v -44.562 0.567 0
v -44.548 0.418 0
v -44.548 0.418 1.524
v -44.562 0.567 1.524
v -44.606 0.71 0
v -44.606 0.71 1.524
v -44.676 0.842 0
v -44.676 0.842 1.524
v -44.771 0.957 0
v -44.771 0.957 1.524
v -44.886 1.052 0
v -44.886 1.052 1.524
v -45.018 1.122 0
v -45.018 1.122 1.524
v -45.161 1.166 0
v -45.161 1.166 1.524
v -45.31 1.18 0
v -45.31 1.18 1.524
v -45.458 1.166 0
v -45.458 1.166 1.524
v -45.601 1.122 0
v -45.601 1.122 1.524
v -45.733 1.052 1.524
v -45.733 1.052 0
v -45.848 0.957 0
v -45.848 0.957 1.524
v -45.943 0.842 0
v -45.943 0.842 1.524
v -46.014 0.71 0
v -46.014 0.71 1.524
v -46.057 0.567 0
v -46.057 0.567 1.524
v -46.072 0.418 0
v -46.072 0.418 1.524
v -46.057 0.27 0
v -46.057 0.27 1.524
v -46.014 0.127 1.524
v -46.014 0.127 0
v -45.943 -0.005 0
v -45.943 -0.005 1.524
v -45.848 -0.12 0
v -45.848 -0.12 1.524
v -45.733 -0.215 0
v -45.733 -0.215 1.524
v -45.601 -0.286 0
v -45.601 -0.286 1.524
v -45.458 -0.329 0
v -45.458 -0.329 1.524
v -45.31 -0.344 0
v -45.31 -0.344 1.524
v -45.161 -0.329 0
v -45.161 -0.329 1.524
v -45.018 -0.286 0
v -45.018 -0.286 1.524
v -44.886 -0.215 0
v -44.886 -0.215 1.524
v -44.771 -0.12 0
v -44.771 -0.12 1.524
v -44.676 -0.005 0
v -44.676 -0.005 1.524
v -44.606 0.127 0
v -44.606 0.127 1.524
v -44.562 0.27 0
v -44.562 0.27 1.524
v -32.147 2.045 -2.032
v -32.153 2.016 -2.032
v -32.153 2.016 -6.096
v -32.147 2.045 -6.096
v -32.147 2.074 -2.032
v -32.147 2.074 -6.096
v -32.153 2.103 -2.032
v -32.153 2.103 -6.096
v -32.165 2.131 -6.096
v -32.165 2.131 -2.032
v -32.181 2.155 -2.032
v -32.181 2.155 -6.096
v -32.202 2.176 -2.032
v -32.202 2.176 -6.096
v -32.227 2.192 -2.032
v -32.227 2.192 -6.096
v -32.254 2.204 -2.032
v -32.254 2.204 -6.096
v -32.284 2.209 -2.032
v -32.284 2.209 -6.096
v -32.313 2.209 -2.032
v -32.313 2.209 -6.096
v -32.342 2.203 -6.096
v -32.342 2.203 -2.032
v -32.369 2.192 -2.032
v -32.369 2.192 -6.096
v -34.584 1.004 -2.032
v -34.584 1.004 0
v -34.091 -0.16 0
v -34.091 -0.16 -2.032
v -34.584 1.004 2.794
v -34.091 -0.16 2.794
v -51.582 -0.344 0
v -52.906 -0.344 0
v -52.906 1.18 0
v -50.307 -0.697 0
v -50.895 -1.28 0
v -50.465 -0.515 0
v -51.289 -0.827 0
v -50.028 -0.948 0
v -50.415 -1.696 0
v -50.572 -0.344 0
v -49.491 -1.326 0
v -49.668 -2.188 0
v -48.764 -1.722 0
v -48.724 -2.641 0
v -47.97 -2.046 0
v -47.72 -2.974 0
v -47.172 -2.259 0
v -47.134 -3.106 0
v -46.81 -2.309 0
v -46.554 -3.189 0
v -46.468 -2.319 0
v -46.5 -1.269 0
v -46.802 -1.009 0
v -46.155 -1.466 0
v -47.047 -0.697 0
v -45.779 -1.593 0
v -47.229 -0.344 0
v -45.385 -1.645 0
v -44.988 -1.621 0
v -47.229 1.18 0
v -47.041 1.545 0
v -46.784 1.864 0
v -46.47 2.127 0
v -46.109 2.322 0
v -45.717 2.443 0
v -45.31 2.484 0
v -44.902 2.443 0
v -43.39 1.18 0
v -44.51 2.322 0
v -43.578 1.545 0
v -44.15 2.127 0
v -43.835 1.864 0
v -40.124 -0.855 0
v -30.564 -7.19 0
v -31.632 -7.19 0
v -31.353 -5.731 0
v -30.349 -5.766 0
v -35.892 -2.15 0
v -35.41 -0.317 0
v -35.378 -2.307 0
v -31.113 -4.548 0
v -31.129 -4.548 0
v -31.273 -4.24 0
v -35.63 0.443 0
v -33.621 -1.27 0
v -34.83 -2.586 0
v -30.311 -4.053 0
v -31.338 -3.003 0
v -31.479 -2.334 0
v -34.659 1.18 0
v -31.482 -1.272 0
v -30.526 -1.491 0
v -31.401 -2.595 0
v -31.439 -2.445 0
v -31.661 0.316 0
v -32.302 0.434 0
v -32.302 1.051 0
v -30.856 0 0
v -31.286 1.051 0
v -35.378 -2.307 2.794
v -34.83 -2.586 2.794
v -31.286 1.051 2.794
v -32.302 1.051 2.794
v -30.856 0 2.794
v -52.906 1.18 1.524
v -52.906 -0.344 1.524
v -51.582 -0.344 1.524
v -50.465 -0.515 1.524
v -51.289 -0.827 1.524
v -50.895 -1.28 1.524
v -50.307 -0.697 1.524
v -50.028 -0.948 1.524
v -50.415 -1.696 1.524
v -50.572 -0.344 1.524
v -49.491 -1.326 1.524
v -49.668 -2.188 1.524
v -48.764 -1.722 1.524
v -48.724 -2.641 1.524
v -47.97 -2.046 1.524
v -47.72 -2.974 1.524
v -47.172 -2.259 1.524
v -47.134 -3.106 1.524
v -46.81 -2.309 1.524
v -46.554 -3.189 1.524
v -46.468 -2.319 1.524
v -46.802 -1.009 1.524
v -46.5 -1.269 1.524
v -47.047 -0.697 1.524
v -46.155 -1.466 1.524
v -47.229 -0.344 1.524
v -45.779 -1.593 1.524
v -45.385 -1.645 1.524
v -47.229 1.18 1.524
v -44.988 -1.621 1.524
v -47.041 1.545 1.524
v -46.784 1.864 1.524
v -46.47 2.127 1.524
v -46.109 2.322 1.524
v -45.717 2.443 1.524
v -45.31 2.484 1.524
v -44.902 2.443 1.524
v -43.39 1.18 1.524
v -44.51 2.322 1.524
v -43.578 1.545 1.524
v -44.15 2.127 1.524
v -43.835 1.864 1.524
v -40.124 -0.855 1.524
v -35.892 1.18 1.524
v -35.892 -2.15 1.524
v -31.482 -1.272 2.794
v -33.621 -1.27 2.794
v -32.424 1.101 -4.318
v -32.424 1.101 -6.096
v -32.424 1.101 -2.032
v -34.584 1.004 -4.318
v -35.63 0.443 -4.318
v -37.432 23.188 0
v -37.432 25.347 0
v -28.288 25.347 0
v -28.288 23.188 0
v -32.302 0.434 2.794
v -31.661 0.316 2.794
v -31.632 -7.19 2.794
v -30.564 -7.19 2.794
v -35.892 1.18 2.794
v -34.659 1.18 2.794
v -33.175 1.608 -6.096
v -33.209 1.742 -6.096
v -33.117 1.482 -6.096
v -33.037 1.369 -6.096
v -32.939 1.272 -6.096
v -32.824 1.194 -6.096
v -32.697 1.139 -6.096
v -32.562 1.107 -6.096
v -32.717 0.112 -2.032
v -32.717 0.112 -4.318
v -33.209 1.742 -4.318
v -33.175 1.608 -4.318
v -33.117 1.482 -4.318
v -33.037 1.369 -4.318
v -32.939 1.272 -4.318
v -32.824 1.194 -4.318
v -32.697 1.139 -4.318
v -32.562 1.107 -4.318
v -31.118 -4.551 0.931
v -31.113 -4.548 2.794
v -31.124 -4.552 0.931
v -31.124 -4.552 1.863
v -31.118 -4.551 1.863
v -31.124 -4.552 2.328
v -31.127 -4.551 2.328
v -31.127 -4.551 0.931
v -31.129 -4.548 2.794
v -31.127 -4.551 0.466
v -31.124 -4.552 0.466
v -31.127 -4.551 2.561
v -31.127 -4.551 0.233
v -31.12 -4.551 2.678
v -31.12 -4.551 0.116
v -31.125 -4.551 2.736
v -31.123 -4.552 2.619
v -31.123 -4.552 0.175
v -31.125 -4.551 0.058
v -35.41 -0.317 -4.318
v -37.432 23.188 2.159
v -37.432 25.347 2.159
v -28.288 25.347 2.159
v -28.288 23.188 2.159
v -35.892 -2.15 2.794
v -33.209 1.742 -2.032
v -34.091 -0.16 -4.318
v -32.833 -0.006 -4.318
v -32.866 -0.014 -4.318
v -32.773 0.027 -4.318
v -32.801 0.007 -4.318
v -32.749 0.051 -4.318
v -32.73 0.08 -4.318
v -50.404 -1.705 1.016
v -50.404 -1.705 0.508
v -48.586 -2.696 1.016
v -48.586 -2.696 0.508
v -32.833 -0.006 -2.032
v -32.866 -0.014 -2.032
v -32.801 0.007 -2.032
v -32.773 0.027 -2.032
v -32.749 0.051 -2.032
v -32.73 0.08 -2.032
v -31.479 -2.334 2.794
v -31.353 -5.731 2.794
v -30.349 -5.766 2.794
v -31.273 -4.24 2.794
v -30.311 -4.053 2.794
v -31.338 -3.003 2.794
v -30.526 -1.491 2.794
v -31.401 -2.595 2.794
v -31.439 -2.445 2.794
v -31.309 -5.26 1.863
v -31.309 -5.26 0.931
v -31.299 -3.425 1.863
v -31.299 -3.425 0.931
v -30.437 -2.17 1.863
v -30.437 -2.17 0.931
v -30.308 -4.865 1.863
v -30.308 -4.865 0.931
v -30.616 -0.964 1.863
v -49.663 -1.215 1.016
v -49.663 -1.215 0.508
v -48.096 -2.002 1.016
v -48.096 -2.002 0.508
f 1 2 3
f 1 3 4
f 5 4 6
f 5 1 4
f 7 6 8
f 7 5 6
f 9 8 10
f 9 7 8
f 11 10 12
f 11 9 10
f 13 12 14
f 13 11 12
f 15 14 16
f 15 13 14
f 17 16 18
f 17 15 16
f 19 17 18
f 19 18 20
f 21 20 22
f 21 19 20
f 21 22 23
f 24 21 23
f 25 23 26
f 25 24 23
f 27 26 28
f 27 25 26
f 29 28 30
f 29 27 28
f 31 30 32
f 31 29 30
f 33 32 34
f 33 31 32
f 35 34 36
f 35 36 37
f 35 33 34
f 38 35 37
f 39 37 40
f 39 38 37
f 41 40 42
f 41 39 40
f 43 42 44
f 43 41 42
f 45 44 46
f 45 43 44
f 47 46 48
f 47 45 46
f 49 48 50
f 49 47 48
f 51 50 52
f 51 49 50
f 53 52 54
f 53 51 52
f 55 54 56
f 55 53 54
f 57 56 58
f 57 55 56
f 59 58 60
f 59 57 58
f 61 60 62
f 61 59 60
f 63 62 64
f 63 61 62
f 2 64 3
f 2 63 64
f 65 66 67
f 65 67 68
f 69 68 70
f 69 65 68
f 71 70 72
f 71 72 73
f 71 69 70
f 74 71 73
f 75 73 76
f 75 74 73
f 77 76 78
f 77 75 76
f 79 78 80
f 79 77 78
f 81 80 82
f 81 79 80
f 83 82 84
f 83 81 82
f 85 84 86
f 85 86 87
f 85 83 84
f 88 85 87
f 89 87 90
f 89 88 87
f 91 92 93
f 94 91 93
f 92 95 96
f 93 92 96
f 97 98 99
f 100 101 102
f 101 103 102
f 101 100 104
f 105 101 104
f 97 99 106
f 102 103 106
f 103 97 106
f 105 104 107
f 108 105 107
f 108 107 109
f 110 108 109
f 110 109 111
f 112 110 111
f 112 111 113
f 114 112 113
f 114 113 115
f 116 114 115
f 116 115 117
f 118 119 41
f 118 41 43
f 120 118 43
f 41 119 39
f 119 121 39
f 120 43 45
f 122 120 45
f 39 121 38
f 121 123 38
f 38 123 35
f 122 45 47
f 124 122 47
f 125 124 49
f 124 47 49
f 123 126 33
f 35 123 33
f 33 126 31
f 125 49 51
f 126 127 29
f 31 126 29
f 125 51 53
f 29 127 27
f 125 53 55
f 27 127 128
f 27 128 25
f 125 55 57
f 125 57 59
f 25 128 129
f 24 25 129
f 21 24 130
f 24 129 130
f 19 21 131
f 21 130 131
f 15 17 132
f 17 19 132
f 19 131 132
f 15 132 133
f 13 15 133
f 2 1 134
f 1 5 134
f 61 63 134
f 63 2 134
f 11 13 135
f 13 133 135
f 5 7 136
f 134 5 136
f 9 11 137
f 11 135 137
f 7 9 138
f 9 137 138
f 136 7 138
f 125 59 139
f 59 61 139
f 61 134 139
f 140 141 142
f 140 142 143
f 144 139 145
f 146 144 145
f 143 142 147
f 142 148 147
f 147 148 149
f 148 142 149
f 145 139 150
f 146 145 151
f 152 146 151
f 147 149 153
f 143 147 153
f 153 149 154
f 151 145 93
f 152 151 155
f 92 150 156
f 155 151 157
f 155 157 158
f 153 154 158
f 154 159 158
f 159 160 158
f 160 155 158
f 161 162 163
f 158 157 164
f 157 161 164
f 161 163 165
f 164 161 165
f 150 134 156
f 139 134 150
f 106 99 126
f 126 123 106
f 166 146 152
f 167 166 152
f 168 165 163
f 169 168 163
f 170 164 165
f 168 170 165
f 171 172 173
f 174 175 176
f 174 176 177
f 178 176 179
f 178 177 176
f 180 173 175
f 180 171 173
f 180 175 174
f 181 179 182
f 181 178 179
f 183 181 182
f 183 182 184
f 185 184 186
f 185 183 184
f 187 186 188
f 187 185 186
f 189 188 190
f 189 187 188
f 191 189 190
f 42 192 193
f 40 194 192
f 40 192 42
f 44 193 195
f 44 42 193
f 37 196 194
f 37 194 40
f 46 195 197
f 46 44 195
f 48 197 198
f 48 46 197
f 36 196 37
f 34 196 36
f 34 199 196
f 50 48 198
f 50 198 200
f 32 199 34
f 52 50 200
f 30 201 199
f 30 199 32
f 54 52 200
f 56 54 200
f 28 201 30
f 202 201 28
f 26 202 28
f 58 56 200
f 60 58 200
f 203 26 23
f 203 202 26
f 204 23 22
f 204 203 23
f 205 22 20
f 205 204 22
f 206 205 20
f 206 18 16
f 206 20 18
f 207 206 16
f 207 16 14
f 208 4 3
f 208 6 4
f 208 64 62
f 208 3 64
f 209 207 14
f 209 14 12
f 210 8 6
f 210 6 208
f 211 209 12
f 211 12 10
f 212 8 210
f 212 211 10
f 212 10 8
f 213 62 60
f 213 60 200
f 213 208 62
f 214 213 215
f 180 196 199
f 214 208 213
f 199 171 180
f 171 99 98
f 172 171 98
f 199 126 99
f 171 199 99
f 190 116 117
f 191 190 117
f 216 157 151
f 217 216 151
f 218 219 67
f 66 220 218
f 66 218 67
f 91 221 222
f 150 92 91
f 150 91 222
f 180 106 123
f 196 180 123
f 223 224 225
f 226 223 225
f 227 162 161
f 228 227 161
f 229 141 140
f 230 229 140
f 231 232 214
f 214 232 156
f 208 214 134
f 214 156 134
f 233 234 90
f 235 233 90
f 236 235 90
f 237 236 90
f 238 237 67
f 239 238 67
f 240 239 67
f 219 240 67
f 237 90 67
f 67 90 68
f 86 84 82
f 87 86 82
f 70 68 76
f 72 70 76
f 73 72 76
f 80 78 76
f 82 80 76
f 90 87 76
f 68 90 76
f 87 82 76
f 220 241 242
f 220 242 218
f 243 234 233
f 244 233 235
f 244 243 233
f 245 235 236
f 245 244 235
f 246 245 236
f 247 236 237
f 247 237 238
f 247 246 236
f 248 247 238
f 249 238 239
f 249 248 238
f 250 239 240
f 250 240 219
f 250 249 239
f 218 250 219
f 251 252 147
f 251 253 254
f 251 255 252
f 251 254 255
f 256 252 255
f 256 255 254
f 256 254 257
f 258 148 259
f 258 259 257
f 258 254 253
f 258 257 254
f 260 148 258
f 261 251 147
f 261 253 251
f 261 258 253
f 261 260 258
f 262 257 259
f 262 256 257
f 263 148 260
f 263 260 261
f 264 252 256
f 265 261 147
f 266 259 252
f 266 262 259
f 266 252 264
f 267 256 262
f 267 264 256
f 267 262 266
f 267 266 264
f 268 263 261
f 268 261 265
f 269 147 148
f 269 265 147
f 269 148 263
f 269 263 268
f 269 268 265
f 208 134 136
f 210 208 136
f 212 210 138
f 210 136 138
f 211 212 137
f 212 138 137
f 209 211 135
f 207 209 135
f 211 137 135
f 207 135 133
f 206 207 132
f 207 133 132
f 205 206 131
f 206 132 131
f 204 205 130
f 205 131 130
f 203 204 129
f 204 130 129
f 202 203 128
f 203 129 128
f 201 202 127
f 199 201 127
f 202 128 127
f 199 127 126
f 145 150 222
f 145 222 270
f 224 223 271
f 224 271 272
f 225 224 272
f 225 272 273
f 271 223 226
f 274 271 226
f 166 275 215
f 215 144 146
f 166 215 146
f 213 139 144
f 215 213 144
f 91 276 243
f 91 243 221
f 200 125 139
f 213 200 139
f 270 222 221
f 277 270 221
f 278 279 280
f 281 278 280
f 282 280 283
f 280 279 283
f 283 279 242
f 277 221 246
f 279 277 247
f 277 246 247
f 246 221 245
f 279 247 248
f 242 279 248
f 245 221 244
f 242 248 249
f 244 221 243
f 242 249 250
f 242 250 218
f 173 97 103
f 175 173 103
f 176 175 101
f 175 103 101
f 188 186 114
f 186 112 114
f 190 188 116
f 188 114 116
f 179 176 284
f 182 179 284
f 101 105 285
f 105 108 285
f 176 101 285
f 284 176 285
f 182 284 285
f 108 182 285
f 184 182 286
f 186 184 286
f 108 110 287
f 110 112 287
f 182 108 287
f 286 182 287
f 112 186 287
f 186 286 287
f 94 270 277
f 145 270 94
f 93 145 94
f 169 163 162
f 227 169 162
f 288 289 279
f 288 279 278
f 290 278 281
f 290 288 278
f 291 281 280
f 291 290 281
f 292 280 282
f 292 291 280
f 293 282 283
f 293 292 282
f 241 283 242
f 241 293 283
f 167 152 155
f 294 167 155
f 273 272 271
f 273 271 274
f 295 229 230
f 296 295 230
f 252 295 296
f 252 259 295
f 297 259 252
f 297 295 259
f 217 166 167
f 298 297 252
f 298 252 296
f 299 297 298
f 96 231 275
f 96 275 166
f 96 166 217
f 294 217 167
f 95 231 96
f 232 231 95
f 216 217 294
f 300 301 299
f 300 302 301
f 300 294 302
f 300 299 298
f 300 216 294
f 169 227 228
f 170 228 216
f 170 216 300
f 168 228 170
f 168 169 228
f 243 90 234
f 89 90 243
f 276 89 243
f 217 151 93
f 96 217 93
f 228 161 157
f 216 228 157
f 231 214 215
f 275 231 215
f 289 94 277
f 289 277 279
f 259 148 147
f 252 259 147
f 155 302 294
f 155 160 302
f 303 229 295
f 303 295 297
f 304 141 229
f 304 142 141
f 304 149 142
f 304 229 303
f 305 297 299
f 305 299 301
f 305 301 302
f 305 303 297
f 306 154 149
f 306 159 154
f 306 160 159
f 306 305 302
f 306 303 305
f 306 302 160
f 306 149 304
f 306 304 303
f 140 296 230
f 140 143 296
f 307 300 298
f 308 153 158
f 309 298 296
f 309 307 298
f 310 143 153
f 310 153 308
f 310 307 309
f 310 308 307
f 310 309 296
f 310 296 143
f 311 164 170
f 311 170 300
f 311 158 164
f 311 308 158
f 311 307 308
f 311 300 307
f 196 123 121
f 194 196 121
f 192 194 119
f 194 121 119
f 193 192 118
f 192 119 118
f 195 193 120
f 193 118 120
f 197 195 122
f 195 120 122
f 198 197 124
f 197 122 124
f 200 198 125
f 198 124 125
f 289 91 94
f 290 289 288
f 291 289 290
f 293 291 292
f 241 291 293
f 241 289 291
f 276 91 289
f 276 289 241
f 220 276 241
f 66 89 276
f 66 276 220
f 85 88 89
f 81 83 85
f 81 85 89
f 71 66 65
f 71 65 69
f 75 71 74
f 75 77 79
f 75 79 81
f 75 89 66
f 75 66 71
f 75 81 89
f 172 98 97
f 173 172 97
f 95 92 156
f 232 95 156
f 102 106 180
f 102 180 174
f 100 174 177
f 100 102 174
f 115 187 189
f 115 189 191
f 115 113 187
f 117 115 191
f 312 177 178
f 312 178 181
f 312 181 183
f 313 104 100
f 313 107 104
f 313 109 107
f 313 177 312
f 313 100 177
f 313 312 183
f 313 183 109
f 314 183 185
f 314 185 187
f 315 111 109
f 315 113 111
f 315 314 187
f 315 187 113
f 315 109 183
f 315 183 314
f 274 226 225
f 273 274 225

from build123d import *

# Parameters (mm, degrees)
F0_R     = 0.762
F1_DEPTH = 1.524
F2_DEPTH = 2.794
F3_DEPTH = 2.032
F4_DEPTH = 2.286
F5_DEPTH = 2.032
F6_DEPTH = 6.096
F7_DEPTH = 2.032
F8_W     = 9.144
F8_H     = 2.159
F9_DEPTH = 2.159


with BuildPart() as f1:
    # F0 (on Top) → F1 (new body)
    with BuildSketch(Plane.XY):
        with BuildLine():
            Line((-52.9059080714, 1.1804393729), (-52.9059080714, -0.3435606271))
            Line((-52.9059080714, -0.3435606271), (-51.582429558, -0.3435606271))
            add(Edge.make_bspline(
                [(-51.582429558, -0.3435606271), (-50.8640110493, -1.8478401471), (-48.5522598028, -2.9866045807), (-46.5541519225, -3.1886603683)],
                knots=[0, 0, 0, 0, 5.777384228, 5.777384228, 5.777384228, 5.777384228], degree=3))
            Line((-46.5541519225, -3.1886603683), (-46.4681722224, -2.3193887901))
            add(Edge.make_bspline(
                [(-50.5721531808, -0.3435606271), (-50.1904897392, -1.1294196593), (-47.9274615645, -2.3642899469), (-46.4681722224, -2.3193887901)],
                knots=[0, 0, 0, 0, 4.5548388157, 4.5548388157, 4.5548388157, 4.5548388157], degree=3))
            Line((-50.5721531808, -0.3435606271), (-47.2289341032, -0.3435606271))
            ThreePointArc((-47.2289341032, -0.3435606271), (-46.3325161766, -1.3755073899), (-44.9879067227, -1.6214842931))
            Line((-44.9879067227, -1.6214842931), (-40.1243688013, -0.8546638176))
            Line((-40.1243688013, -0.8546638176), (-35.8917377889, -2.1498848777))
            Line((-35.8917377889, -2.1498848777), (-35.8917377889, 1.1804393729))
            Line((-35.8917377889, 1.1804393729), (-43.3901375056, 1.1804393729))
            ThreePointArc((-43.3901375056, 1.1804393729), (-45.3095358044, 2.4835625725), (-47.2289341032, 1.1804393729))
            Line((-47.2289341032, 1.1804393729), (-52.9059080714, 1.1804393729))
        make_face()
        with Locations((-45.3095358044, 0.4184393729)):
            Circle(F0_R, mode=Mode.SUBTRACT)
    extrude(amount=F1_DEPTH)

    # F0 (on Top) → F2 (join)
    with BuildSketch(Plane.XY):
        Polygon((-34.0913433825, -0.1597238928), (-34.5840068127, 1.0043503495), (-35.6301553547, 0.4432875139), (-35.4101397097, -0.3167598043), align=None)
        with BuildLine():
            Line((-34.6585318036, 1.1804393729), (-35.8917377889, 1.1804393729))
            Line((-35.8917377889, 1.1804393729), (-35.8917377889, -2.1498848777))
            Line((-35.8917377889, -2.1498848777), (-35.3784411206, -2.3069580204))
            Line((-35.3784411206, -2.3069580204), (-34.8295137185, -2.5856126798))
            Line((-34.8295137185, -2.5856126798), (-31.4794085818, -2.3337935331))
            add(Edge.make_bspline(
                [(-31.6321253777, -7.1895001456), (-31.1125088483, -5.4274534341), (-31.2449969351, -2.838549437), (-31.4794085818, -2.3337935331)],
                knots=[0, 0, 0, 0, 4.8581075664, 4.8581075664, 4.8581075664, 4.8581075664], degree=3))
            Line((-31.6321253777, -7.1895001456), (-30.5641852319, -7.1895001456))
            add(Edge.make_bspline(
                [(-30.85613437, 0), (-30.3239002824, -1.6103395028), (-30.0836134702, -5.3473527078), (-30.5641852319, -7.1895001456)],
                knots=[0, 0, 0, 0, 7.1954253969, 7.1954253969, 7.1954253969, 7.1954253969], degree=3))
            Line((-30.85613437, 0), (-31.2861613929, 1.0513478192))
            Line((-31.2861613929, 1.0513478192), (-32.3019280619, 1.0513478192))
            Line((-32.3019280619, 1.0513478192), (-32.3019280619, 0.4340257832))
            Line((-32.3019280619, 0.4340257832), (-31.661439687, 0.3159865737))
            Line((-31.661439687, 0.3159865737), (-31.4816348255, -1.272317837))
            Line((-31.4816348255, -1.272317837), (-33.6214109845, -1.2700888328))
            Line((-33.6214109845, -1.2700888328), (-34.0913433825, -0.1597238928))
            Line((-34.0913433825, -0.1597238928), (-35.4101397097, -0.3167598043))
            Line((-35.4101397097, -0.3167598043), (-35.6301553547, 0.4432875139))
            Line((-35.6301553547, 0.4432875139), (-34.5840068127, 1.0043503495))
            Line((-34.5840068127, 1.0043503495), (-34.6585318036, 1.1804393729))
        make_face()
        with BuildLine():
            add(Edge.make_bspline(
                [(-31.1293303967, -4.5481100678), (-31.1246114303, -4.5548154266), (-31.118311582, -4.5504629332), (-31.1125088483, -4.5481100678)],
                knots=[0.9334682043, 0.9334682043, 0.9334682043, 0.9334682043, 1, 1, 1, 1], degree=3))
            Line((-31.1293303967, -4.5481100678), (-31.1125088483, -4.5481100678))
        make_face(mode=Mode.SUBTRACT)
    extrude(amount=F2_DEPTH)

    # F0 (on Top) → F3 (join)
    with BuildSketch(Plane.XY):
        Polygon((-34.0913433825, -0.1597238928), (-34.5840068127, 1.0043503495), (-35.6301553547, 0.4432875139), (-35.4101397097, -0.3167598043), align=None)
        with BuildLine():
            Line((-33.2091721971, 1.7416917279), (-34.5840068127, 1.0043503495))
            Line((-34.5840068127, 1.0043503495), (-34.0913433825, -0.1597238928))
            Line((-34.0913433825, -0.1597238928), (-32.8661898483, -0.013838514))
            ThreePointArc((-32.8661898483, -0.013838514), (-32.7725794729, 0.0268024284), (-32.716734131, 0.1122183892))
            Line((-32.716734131, 0.1122183892), (-32.4239792458, 1.1005867628))
            ThreePointArc((-32.4239792458, 1.1005867628), (-32.9386409699, 1.2716398998), (-33.2091721971, 1.7416917279))
        make_face()
        with BuildLine():
            Line((-32.3694203779, 2.1920613628), (-33.2091721971, 1.7416917279))
            ThreePointArc((-33.2091721971, 1.7416917279), (-32.9386409699, 1.2716398998), (-32.4239792458, 1.1005867628))
            Line((-32.4239792458, 1.1005867628), (-32.1528931797, 2.015799139))
            ThreePointArc((-32.1528931797, 2.015799139), (-32.2024336622, 2.1760679537), (-32.3694203779, 2.1920613628))
        make_face()
    extrude(amount=-F3_DEPTH)

    # F4 (add): a face of the model
    f4_faces = [f1.faces().sort_by_distance(p)[0] for p in [
        (-33.7411845506, 0.7238933588, -2.032),
    ]]
    extrude(f4_faces, amount=F4_DEPTH)

    # F0 (on Top) → F5 (cut)
    with BuildSketch(Plane.XY):
        with BuildLine():
            Line((-33.2091721971, 1.7416917279), (-34.5840068127, 1.0043503495))
            Line((-34.5840068127, 1.0043503495), (-34.0913433825, -0.1597238928))
            Line((-34.0913433825, -0.1597238928), (-32.8661898483, -0.013838514))
            ThreePointArc((-32.8661898483, -0.013838514), (-32.7725794729, 0.0268024284), (-32.716734131, 0.1122183892))
            Line((-32.716734131, 0.1122183892), (-32.4239792458, 1.1005867628))
            ThreePointArc((-32.4239792458, 1.1005867628), (-32.9386409699, 1.2716398998), (-33.2091721971, 1.7416917279))
        make_face()
        with BuildLine():
            Line((-32.3694203779, 2.1920613628), (-33.2091721971, 1.7416917279))
            ThreePointArc((-33.2091721971, 1.7416917279), (-32.9386409699, 1.2716398998), (-32.4239792458, 1.1005867628))
            Line((-32.4239792458, 1.1005867628), (-32.1528931797, 2.015799139))
            ThreePointArc((-32.1528931797, 2.015799139), (-32.2024336622, 2.1760679537), (-32.3694203779, 2.1920613628))
        make_face()
    extrude(amount=-F5_DEPTH, mode=Mode.SUBTRACT)

    # F0 (on Top) → F6 (join)
    with BuildSketch(Plane.XY):
        with BuildLine():
            Line((-32.3694203779, 2.1920613628), (-33.2091721971, 1.7416917279))
            ThreePointArc((-33.2091721971, 1.7416917279), (-32.9386409699, 1.2716398998), (-32.4239792458, 1.1005867628))
            Line((-32.4239792458, 1.1005867628), (-32.1528931797, 2.015799139))
            ThreePointArc((-32.1528931797, 2.015799139), (-32.2024336622, 2.1760679537), (-32.3694203779, 2.1920613628))
        make_face()
    extrude(amount=-F6_DEPTH)

    # F0 (on Top) → F7 (cut, through all)
    with BuildSketch(Plane.XY):
        with BuildLine():
            Line((-32.3694203779, 2.1920613628), (-33.2091721971, 1.7416917279))
            ThreePointArc((-33.2091721971, 1.7416917279), (-32.9386409699, 1.2716398998), (-32.4239792458, 1.1005867628))
            Line((-32.4239792458, 1.1005867628), (-32.1528931797, 2.015799139))
            ThreePointArc((-32.1528931797, 2.015799139), (-32.2024336622, 2.1760679537), (-32.3694203779, 2.1920613628))
        make_face()
    extrude(amount=-F7_DEPTH, mode=Mode.SUBTRACT)


with BuildPart() as f9:
    # F8 (on Top) → F9 (new body)
    with BuildSketch(Plane.XY):
        with Locations((-32.8595417796, 24.2671417072)):
            Rectangle(F8_W, F8_H)
    extrude(amount=F9_DEPTH)


solid = Compound([f1.part, f9.part])
